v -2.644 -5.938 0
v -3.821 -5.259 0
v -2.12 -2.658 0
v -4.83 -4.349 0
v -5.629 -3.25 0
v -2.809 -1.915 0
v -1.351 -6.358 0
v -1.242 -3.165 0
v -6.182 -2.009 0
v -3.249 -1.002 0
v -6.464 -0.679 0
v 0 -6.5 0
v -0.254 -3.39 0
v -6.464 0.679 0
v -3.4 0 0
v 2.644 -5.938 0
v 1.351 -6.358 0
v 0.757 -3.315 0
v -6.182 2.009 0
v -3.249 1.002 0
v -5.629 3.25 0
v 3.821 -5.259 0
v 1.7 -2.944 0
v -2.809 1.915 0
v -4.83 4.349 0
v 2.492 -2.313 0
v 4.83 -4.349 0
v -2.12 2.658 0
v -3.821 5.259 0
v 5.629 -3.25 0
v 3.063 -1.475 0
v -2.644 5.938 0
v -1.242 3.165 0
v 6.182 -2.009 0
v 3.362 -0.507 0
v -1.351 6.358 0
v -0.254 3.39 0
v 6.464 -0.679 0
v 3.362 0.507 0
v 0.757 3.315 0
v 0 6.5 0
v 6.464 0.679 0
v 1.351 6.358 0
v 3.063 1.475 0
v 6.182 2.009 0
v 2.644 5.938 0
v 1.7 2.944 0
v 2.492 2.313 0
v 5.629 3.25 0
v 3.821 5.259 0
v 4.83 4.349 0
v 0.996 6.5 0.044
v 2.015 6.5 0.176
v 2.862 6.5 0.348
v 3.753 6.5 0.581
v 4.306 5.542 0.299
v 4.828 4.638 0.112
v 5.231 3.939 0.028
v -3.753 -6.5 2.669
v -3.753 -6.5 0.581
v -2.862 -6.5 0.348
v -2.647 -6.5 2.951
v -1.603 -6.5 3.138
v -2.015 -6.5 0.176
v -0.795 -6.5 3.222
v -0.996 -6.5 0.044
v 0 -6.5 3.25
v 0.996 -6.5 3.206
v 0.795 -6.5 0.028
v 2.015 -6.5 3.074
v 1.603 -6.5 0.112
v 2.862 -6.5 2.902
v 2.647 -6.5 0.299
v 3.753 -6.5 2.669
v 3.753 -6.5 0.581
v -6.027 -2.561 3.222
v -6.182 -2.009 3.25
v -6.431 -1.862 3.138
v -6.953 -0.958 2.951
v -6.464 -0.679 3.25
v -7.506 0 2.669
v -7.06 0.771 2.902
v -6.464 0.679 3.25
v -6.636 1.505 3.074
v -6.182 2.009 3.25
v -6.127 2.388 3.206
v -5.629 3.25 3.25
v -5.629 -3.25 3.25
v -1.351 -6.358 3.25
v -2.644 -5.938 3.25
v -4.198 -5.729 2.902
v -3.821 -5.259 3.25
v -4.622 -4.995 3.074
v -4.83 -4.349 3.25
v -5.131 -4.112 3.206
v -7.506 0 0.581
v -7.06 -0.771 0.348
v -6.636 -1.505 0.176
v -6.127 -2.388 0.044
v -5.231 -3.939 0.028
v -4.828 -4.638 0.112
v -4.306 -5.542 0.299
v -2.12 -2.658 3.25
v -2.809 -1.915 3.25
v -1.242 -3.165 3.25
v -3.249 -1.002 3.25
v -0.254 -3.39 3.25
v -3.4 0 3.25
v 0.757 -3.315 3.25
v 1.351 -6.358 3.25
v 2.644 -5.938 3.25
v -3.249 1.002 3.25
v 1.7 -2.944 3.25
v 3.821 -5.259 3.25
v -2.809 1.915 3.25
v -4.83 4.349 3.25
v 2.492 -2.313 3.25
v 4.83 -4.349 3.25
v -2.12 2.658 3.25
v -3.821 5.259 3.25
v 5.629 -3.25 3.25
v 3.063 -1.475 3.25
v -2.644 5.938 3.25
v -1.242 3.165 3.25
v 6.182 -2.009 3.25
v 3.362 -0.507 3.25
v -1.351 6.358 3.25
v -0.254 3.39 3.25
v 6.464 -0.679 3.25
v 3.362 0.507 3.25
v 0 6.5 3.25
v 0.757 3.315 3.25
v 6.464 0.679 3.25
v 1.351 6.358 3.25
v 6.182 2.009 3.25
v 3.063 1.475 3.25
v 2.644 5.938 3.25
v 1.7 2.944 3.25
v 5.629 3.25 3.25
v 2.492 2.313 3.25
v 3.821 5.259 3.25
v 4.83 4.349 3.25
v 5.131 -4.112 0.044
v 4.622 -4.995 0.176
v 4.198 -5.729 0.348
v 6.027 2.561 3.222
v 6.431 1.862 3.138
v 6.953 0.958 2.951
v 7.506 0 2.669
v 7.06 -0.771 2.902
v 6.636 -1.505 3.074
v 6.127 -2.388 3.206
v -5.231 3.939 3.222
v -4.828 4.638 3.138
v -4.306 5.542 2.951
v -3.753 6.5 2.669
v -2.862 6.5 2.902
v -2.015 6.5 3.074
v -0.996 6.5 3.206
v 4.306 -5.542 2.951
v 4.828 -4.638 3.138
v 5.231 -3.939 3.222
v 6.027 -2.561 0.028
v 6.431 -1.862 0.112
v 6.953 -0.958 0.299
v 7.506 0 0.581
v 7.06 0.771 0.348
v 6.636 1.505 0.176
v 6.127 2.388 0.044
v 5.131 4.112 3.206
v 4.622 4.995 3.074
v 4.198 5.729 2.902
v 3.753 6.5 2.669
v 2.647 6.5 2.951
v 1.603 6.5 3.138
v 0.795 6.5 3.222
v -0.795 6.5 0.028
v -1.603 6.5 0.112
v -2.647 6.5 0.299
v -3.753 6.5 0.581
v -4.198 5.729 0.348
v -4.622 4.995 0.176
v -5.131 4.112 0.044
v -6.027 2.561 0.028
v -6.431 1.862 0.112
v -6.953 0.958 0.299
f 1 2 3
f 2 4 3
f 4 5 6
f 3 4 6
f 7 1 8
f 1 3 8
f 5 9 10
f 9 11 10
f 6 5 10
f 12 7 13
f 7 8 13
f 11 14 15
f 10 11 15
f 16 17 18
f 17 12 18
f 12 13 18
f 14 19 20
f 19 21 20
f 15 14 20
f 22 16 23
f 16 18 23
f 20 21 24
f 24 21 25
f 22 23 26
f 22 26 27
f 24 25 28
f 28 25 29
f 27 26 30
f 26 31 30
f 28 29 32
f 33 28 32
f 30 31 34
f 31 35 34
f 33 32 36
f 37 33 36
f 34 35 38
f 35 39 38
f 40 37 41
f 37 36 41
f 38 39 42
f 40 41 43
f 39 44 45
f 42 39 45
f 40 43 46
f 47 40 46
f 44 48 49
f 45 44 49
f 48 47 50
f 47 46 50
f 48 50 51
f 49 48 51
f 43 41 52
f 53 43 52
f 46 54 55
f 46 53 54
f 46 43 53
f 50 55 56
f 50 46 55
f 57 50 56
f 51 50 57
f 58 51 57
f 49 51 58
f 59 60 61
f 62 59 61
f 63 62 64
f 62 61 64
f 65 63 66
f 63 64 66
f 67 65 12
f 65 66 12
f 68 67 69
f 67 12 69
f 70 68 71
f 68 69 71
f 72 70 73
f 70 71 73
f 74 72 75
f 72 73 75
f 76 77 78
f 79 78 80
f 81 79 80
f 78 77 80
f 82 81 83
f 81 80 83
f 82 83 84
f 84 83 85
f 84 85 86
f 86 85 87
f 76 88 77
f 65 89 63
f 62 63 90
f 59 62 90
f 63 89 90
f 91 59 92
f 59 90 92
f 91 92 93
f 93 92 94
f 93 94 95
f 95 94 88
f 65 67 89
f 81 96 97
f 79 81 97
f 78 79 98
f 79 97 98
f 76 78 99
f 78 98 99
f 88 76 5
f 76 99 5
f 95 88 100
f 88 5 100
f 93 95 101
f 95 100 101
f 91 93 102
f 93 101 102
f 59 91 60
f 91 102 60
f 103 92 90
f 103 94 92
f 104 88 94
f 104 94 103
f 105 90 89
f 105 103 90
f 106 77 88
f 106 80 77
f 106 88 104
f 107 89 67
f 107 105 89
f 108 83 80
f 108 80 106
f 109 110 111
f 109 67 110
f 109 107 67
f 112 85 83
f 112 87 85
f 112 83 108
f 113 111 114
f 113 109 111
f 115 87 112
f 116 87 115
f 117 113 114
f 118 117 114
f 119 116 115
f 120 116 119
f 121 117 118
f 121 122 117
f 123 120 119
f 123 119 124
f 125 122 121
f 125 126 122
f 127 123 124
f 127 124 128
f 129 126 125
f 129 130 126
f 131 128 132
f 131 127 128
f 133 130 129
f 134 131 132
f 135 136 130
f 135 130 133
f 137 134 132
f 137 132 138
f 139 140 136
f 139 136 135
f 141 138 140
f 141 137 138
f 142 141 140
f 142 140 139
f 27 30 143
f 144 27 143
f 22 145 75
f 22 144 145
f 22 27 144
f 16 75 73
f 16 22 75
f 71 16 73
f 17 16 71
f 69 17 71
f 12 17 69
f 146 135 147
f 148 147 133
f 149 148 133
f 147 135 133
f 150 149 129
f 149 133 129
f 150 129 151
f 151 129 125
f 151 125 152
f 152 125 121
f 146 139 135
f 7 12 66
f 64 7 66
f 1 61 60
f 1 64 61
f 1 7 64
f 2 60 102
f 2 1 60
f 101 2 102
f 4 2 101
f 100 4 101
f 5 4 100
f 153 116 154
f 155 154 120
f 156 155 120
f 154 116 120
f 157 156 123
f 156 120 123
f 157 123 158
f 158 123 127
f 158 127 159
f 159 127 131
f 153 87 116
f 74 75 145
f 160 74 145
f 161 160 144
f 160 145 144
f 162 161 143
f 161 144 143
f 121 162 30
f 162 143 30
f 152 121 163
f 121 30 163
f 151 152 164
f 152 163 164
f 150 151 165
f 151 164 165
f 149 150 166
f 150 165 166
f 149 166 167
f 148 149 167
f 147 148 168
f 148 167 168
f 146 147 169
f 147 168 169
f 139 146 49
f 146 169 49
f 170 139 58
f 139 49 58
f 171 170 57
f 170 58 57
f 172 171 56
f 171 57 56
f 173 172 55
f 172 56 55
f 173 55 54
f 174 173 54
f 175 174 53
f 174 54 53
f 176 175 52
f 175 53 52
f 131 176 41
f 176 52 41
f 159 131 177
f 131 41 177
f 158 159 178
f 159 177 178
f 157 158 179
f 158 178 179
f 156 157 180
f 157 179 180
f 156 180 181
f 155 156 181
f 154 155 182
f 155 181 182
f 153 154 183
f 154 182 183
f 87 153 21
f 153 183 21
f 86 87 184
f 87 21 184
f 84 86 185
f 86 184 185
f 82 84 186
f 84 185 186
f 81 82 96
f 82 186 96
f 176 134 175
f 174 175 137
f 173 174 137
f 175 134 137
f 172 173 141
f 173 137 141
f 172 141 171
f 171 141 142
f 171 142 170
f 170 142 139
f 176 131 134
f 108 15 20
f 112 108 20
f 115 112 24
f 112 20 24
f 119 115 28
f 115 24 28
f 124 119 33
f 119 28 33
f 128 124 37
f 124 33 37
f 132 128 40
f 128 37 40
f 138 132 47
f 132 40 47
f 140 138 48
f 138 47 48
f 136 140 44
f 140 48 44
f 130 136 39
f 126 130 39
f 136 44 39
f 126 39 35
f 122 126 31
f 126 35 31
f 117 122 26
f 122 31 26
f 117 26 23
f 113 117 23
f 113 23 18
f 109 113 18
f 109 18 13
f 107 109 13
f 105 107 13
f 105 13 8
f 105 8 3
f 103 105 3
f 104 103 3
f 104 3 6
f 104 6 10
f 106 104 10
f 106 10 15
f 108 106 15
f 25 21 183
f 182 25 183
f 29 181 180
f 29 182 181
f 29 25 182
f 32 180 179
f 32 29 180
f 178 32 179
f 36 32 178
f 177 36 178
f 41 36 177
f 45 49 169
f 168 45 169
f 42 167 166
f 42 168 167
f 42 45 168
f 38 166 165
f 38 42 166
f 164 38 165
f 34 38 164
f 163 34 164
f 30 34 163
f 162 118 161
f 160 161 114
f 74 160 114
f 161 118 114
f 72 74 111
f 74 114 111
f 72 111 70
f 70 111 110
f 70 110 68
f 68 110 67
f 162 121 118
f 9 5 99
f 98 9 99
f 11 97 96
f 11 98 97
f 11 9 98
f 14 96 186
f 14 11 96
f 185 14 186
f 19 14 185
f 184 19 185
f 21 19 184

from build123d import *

# Parameters (mm, degrees)
BOSS_EXTRUDE1_DEPTH = 3.25
M8_TAPPED_HOLE1_D   = 6.8


with BuildPart() as part:
    # Sketch1 → Boss-Extrude1 (new body)
    with BuildSketch(Plane.XY):
        Polygon((3.75277675, -6.5), (7.505553499, 0), (3.75277675, 6.5), (-3.75277675, 6.5), (-7.505553499, 0), (-3.75277675, -6.5), align=None)
    extrude(amount=BOSS_EXTRUDE1_DEPTH)

    # Sketch3 → Cut-Revolve1 (revolve, cut)
    with BuildSketch(Plane(origin=(0, 0, 0), x_dir=(0, 0, -1), z_dir=(1, 0, 0))):
        Polygon((-1.711637245, 9.464642673), (0, 6.5), (0, 9.464642673), align=None)
        Polygon((-3.25, 6.5), (-3.25, 7.969336789), (-2.401678009, 7.969336789), align=None)
    revolve(axis=Axis((0, 0, 0), (0, 0, -1)), mode=Mode.SUBTRACT)

    # M8 Tapped Hole1 (through all)
    with Locations(Plane.XY.offset(3.25)):
        with Locations((0, 0)):
            Hole(M8_TAPPED_HOLE1_D / 2)


solid = part.part
